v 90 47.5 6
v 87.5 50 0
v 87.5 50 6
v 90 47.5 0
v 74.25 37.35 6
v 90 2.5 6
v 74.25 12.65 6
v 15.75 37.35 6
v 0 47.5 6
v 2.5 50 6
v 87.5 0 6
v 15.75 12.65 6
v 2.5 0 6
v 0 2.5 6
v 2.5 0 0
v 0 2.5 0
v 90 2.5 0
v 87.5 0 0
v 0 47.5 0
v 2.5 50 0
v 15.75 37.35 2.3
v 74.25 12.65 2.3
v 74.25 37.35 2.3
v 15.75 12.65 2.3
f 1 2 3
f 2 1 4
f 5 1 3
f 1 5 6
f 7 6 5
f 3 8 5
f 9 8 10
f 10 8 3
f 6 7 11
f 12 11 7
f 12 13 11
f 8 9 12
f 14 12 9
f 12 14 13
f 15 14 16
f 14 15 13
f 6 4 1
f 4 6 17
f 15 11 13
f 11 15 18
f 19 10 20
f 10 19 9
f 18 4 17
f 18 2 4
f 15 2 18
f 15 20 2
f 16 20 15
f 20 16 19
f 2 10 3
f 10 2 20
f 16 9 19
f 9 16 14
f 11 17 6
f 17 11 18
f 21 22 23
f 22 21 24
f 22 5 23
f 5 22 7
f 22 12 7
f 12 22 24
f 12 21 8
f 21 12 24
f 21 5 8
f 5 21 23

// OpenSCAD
$fn = 32;

// ----------------------------------------------------------------------
// Windowed plate: 1 voids, 90 x 50 x 6 mm
// ----------------------------------------------------------------------

// --- parameters (mm) ---
plate_l = 90;             // plate length, X
plate_w = 50;             // plate width, Y
plate_t = 6;              // plate thickness, Z
edge_margin = 8;          // wall from the plate edge to any window
win1_l = 58.5;            // window length
win1_w = 24.7;            // window width
depth_1 = 3.7;            // depth of void 1 (full thickness = through)
corner_c = 2.5;           // corner chamfer of the plate

profile = [[2.5, 0], [87.5, 0], [90, 2.5], [90, 47.5], [87.5, 50], [2.5, 50], [0, 47.5], [0, 2.5]];  // primary outline, 8 points, counter clockwise
void_1 = [[15.75, 12.65], [74.25, 12.65], [74.25, 37.35], [15.75, 37.35]];  // large central window, 4 points

// --- the one profile operation ---
difference() {
  linear_extrude(height = plate_t) polygon(points = profile);
  translate([0, 0, plate_t - depth_1])
    linear_extrude(height = depth_1 + 1) polygon(points = void_1);
}
